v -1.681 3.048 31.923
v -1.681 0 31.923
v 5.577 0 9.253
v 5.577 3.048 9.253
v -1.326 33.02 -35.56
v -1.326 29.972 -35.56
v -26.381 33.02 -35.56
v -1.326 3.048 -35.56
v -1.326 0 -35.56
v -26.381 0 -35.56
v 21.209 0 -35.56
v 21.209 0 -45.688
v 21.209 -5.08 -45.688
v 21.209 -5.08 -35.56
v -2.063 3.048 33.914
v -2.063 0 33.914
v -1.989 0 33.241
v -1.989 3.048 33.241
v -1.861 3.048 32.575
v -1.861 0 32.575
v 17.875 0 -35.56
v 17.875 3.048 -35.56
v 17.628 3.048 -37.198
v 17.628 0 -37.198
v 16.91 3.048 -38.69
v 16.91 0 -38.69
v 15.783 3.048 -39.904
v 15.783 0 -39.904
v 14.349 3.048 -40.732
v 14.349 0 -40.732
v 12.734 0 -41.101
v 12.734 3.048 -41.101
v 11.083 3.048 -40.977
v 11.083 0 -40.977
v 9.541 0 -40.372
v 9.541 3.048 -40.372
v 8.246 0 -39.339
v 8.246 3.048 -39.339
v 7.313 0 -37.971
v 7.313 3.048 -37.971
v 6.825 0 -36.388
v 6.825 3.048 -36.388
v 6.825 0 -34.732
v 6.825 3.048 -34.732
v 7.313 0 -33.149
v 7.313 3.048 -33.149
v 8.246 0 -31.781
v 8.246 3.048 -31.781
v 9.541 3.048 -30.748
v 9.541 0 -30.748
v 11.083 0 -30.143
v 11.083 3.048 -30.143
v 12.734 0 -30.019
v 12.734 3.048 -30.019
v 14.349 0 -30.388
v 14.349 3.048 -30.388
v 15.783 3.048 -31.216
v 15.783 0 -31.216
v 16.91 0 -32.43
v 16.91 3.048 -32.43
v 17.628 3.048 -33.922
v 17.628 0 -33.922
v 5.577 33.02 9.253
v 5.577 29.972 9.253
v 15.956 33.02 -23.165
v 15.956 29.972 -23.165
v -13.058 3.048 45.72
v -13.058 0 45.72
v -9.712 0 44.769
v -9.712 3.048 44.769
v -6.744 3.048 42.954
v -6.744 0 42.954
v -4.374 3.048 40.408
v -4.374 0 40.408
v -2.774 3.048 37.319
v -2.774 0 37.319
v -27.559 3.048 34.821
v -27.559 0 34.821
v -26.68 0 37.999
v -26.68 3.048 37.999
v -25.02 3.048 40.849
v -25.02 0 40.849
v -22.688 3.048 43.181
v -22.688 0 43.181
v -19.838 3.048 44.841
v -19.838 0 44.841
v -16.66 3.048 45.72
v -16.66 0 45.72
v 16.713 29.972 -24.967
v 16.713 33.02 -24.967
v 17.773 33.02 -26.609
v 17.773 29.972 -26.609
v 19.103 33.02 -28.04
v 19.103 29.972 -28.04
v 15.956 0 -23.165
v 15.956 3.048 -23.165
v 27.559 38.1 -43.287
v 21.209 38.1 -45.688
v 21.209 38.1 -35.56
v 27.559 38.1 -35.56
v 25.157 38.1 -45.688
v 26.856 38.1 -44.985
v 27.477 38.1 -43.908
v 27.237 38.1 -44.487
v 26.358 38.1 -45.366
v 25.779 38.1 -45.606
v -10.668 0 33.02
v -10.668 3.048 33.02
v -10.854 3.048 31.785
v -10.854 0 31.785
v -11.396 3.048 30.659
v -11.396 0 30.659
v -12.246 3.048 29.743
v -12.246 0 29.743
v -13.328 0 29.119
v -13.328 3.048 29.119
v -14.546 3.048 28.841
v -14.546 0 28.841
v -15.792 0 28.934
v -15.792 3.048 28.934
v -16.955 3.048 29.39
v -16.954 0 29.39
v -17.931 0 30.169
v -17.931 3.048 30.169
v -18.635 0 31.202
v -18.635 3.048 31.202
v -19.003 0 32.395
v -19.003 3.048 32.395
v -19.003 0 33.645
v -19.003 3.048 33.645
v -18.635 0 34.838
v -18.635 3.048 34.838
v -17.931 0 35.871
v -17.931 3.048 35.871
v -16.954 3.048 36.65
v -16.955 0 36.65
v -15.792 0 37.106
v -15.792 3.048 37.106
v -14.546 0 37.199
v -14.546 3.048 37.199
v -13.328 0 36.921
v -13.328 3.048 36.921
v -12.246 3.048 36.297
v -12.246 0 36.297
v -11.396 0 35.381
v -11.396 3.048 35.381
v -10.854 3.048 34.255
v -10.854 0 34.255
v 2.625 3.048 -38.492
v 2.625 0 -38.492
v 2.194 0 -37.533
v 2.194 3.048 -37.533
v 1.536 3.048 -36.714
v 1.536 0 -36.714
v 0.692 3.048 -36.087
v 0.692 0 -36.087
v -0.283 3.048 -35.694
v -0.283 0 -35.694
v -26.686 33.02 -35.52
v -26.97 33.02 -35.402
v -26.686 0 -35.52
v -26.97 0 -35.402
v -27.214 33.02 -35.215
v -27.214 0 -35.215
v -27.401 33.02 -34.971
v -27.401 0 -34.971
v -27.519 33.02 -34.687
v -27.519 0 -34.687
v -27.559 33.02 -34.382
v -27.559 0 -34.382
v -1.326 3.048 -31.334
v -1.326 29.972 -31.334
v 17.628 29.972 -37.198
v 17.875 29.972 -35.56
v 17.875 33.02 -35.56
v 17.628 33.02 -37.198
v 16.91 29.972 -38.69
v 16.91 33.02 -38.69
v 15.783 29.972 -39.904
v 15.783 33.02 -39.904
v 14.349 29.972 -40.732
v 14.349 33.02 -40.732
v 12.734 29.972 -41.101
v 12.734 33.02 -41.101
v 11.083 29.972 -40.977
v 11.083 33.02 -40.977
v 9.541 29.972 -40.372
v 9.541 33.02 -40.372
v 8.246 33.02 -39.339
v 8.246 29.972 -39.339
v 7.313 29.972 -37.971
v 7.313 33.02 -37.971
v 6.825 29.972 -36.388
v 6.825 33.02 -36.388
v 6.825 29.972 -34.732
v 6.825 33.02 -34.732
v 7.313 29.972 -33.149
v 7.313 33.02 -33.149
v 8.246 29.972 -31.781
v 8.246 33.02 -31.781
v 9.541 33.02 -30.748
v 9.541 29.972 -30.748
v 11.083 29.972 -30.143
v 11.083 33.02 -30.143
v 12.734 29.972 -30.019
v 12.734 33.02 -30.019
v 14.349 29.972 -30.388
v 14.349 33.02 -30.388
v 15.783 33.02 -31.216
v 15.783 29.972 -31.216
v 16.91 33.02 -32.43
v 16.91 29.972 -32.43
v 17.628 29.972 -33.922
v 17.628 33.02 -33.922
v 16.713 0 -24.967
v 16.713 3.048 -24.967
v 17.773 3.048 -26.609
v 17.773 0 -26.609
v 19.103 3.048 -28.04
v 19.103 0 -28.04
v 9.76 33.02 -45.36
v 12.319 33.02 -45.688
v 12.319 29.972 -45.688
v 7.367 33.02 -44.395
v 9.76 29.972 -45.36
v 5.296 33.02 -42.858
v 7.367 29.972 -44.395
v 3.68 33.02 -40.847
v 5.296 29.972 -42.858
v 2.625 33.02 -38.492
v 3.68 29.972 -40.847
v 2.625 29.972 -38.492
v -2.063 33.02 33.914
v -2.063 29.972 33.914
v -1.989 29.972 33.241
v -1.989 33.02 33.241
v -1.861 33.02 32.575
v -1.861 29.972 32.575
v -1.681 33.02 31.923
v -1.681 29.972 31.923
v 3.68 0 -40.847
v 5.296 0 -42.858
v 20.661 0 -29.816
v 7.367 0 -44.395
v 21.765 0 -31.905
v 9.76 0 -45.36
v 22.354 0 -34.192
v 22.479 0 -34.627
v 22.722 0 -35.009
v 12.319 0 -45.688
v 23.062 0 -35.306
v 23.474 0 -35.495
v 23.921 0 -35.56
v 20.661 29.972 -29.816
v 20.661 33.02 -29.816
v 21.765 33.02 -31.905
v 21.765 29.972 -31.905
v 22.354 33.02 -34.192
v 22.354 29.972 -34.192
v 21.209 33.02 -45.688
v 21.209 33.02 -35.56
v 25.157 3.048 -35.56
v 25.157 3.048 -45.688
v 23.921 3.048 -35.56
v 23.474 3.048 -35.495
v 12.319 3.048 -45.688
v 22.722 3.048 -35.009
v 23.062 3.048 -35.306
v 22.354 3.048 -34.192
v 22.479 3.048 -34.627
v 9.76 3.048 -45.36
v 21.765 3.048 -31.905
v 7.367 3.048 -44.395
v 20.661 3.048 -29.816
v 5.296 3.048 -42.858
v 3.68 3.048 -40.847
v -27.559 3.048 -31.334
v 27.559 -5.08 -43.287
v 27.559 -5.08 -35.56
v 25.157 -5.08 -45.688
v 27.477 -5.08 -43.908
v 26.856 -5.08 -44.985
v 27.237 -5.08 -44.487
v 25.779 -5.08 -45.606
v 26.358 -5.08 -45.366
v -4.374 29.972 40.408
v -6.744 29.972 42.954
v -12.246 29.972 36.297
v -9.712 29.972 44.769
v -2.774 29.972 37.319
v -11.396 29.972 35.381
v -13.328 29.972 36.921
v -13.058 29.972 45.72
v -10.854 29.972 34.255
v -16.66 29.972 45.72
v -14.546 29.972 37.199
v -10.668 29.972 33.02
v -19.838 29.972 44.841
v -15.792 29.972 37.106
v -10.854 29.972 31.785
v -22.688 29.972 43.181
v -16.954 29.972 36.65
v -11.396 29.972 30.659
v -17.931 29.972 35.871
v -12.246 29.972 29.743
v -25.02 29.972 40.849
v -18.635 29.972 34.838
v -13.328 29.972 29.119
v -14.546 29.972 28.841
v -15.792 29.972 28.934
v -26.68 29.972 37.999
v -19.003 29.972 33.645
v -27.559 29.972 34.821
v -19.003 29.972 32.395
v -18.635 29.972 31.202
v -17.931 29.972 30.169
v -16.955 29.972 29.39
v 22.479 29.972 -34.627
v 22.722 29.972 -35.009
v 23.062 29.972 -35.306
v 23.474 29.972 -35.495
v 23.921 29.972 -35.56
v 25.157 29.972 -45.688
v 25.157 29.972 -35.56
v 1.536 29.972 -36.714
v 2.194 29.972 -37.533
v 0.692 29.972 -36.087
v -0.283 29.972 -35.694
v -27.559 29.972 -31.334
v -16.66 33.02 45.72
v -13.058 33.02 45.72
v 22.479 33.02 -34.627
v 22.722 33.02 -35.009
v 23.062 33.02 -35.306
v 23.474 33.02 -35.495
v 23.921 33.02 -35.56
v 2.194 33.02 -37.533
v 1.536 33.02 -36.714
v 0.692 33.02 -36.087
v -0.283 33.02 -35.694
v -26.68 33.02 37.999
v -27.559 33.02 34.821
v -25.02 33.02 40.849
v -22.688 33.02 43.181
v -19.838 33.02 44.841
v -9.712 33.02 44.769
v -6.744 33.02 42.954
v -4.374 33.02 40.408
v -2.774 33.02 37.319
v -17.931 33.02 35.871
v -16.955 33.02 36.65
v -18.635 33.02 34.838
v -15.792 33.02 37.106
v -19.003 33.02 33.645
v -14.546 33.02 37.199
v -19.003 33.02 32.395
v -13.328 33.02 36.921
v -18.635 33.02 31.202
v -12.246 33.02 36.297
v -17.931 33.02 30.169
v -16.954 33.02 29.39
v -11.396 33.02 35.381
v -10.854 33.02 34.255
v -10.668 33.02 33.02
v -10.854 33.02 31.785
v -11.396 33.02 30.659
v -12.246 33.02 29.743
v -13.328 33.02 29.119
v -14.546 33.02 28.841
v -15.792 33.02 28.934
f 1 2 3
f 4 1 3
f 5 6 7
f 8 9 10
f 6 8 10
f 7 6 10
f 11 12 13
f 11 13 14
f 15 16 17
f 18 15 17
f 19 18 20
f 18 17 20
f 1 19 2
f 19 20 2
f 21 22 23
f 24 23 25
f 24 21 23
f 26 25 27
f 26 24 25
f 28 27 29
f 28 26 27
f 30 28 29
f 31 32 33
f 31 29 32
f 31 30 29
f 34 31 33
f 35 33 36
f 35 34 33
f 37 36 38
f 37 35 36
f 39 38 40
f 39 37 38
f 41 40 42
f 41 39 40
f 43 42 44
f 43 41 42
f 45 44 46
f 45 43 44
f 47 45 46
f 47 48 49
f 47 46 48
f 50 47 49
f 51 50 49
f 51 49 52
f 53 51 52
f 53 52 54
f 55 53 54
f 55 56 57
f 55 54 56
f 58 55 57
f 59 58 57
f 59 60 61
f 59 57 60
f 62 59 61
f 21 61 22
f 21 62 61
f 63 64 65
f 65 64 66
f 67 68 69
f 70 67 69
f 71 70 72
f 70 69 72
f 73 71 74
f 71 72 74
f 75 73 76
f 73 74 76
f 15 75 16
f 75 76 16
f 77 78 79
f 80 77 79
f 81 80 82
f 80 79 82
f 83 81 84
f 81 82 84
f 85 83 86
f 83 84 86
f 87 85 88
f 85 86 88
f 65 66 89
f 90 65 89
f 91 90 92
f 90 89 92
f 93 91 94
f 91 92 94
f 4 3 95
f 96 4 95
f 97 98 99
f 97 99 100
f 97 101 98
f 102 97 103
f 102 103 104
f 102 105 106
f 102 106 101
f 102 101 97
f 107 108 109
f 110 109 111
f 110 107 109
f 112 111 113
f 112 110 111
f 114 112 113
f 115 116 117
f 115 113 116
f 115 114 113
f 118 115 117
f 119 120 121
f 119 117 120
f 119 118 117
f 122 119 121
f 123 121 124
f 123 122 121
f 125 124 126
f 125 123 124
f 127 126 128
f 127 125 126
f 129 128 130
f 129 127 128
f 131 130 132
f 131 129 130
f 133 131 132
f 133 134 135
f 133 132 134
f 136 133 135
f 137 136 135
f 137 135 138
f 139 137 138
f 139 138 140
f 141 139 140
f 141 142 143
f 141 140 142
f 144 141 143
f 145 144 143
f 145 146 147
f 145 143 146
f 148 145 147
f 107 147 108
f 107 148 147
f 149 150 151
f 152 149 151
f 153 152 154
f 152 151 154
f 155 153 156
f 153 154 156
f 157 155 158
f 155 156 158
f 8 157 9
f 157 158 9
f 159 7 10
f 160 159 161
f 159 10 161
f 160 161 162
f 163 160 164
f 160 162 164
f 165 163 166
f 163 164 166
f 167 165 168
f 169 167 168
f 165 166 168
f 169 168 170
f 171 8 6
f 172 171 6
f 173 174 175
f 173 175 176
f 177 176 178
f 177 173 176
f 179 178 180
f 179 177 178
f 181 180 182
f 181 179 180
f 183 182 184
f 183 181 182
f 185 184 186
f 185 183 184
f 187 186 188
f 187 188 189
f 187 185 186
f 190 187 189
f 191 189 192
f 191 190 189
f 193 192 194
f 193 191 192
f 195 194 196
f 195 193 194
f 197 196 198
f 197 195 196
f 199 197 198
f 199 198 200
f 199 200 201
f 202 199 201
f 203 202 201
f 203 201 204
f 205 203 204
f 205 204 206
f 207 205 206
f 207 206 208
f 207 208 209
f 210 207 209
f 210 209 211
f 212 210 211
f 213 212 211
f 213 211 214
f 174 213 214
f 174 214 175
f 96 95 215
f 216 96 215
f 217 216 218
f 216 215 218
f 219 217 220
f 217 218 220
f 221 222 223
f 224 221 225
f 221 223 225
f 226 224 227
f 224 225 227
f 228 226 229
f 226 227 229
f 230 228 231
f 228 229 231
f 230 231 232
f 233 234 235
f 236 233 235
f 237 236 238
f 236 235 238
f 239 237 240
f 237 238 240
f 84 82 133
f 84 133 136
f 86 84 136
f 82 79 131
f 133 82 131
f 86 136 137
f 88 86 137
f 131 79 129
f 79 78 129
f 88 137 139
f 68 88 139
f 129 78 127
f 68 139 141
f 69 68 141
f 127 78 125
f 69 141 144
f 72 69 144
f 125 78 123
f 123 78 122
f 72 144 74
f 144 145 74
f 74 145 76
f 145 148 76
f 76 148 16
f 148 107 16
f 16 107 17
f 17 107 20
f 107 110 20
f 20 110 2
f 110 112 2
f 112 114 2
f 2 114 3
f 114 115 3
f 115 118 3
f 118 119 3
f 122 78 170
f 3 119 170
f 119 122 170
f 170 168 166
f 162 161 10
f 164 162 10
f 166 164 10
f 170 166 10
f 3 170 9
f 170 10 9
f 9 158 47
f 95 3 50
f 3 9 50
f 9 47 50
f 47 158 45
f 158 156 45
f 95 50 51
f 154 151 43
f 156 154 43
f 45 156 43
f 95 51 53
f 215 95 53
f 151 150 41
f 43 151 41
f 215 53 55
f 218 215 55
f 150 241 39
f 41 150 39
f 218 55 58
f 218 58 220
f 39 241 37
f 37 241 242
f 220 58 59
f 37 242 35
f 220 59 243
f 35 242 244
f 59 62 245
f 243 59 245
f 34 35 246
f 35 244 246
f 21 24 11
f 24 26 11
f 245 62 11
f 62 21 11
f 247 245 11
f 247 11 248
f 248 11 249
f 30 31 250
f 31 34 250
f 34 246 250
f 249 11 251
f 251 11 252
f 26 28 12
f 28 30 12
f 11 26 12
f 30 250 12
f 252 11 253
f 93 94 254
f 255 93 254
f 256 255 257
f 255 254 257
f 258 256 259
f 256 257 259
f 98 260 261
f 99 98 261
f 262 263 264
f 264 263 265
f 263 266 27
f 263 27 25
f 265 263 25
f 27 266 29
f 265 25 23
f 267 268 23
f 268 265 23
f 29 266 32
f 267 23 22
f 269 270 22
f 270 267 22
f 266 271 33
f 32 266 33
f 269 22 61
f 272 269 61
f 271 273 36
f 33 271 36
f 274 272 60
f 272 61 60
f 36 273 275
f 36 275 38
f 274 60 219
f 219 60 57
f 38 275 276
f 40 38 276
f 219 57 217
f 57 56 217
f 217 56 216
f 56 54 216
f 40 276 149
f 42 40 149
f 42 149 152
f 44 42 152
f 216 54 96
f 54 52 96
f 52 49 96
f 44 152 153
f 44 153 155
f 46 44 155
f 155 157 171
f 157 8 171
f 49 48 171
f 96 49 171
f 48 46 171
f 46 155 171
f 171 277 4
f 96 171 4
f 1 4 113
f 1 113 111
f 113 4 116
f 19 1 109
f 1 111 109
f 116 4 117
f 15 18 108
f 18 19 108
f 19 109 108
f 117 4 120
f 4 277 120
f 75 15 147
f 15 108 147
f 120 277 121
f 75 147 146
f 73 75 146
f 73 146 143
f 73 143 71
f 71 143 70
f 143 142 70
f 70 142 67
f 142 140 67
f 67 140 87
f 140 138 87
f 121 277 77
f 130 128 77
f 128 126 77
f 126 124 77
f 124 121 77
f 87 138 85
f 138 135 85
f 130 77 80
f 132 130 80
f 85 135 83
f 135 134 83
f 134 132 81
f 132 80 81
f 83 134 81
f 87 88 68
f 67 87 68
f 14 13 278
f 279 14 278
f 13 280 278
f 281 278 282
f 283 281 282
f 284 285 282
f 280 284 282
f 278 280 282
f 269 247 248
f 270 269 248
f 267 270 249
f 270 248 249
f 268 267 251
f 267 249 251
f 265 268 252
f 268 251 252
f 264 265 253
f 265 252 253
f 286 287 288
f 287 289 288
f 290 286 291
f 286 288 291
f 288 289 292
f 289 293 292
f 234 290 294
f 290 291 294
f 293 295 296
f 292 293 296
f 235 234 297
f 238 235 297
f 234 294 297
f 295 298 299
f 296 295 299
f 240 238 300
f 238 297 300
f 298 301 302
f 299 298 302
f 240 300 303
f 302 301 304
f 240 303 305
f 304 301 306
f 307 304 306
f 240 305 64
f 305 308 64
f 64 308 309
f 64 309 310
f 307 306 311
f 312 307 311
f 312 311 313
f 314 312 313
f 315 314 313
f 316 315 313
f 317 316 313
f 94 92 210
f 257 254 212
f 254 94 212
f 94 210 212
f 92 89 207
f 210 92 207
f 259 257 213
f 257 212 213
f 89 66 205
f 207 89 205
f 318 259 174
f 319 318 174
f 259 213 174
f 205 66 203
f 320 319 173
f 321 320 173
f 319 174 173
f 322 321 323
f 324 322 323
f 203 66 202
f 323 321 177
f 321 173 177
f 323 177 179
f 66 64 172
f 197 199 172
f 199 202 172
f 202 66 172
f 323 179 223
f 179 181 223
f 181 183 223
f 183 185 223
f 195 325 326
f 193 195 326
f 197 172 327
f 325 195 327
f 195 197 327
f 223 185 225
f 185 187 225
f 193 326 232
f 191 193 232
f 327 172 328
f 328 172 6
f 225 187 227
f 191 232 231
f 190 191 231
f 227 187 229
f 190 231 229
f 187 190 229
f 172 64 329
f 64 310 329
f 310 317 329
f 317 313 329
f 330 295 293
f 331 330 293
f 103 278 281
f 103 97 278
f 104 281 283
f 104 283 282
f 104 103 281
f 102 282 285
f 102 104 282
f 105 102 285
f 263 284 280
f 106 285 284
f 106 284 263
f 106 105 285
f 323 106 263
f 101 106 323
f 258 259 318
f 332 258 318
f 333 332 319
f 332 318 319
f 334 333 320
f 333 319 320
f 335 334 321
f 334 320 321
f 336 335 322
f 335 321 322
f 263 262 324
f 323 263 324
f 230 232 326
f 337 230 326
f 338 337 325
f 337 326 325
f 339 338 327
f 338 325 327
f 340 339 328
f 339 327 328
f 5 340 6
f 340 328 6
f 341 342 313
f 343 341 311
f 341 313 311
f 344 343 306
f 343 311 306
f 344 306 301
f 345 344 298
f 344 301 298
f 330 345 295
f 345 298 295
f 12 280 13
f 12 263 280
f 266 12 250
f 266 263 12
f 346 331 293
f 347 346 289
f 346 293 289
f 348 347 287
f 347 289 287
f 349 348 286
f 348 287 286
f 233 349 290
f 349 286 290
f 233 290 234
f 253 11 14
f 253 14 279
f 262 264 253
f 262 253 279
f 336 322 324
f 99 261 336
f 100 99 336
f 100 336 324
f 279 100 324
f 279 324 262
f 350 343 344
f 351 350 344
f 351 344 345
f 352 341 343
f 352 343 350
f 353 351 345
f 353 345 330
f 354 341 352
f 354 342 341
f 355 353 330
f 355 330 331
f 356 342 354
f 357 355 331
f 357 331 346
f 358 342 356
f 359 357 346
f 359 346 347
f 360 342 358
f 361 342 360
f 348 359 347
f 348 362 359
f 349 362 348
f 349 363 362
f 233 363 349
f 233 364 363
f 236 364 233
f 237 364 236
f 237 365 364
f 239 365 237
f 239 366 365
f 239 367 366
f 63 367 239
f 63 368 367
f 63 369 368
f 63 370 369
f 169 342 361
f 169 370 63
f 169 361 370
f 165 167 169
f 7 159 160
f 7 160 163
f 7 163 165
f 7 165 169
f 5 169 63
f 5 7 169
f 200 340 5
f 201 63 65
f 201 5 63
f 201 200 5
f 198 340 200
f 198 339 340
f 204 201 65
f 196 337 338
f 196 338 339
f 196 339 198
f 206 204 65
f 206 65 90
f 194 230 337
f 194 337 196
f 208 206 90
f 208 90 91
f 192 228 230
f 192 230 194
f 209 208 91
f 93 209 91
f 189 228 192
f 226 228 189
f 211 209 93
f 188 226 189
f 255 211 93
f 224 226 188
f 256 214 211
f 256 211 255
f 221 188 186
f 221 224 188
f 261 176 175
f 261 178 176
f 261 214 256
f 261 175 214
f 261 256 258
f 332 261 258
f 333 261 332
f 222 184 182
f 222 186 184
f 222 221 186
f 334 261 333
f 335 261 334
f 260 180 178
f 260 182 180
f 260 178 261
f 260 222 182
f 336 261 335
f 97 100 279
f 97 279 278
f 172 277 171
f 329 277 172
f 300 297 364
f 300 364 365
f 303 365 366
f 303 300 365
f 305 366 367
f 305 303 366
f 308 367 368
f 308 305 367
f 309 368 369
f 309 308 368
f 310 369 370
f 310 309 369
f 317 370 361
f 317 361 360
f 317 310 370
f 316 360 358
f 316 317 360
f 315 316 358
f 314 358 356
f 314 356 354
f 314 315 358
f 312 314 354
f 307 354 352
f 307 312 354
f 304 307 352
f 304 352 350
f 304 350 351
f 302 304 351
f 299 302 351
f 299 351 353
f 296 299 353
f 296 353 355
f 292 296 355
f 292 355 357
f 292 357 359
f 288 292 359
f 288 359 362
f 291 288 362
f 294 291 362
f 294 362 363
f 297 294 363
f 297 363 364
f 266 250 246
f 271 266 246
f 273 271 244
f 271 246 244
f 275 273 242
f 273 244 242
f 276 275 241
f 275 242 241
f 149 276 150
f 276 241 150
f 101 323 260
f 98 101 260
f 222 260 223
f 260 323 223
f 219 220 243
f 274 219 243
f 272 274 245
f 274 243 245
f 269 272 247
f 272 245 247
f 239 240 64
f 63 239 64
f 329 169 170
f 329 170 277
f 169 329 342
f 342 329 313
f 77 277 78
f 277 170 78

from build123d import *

# Parameters (mm, degrees)
SKETCH1_R               = 4.191
SKETCH1_R_2             = 5.55625
BOSS_EXTRUDE1_DEPTH     = 33.02
CUT_EXTRUDE1_DEPTH      = 56.118
SKETCH3_W               = 26.483565884
SKETCH3_H               = 26.924
CUT_EXTRUDE2_DEPTH      = 11.12825
CUT_EXTRUDE2_DEPTH_BACK = 82.28
BOSS_EXTRUDE2_DEPTH     = 5.08


with BuildPart() as part:
    # Sketch1 → Boss-Extrude1 (new body)
    with BuildSketch(Plane(origin=(0, 0, 0), x_dir=(1, 0, 0), z_dir=(0, 1, 0))):
        with BuildLine():
            ThreePointArc((-27.559, -34.820535754), (-23.929058682, -42.090058682), (-16.659535754, -45.72))
            Line((-16.659535754, -45.72), (-13.058464246, -45.72))
            ThreePointArc((-13.058464246, -45.72), (-5.472288324, -41.761943314), (-2.063174534, -33.91374473))
            ThreePointArc((-2.063174534, -33.91374473), (-1.931764874, -32.906728948), (-1.680693889, -31.922700165))
            Line((-1.680693889, -31.922700165), (5.577256486, -9.252591406))
            Line((5.577256486, -9.252591406), (15.95594723, 23.165107224))
            ThreePointArc((15.95594723, 23.165107224), (17.206676654, 25.810946447), (19.103326913, 28.039736946))
            ThreePointArc((19.103326913, 28.039736946), (21.273883819, 30.828033828), (22.3544782, 34.19229193))
            ThreePointArc((22.3544782, 34.19229193), (22.881358513, 35.169970415), (23.921231105, 35.56))
            Line((23.921231105, 35.56), (27.559, 35.56))
            Line((27.559, 35.56), (27.559, 43.286638959))
            ThreePointArc((27.559, 43.286638959), (26.855584412, 44.984834412), (25.157388959, 45.68825))
            Line((25.157388959, 45.68825), (12.319, 45.68825))
            ThreePointArc((12.319, 45.68825), (6.28241864, 43.692719935), (2.624566002, 38.492472937))
            ThreePointArc((2.624566002, 38.492472937), (1.133892546, 36.373232242), (-1.326176925, 35.56))
            Line((-1.326176925, 35.56), (-26.38140718, 35.56))
            ThreePointArc((-26.38140718, 35.56), (-27.214091048, 35.215091048), (-27.559, 34.38240718))
            Line((-27.559, 34.38240718), (-27.559, -31.219464246))
            Line((-27.559, -31.219464246), (-27.559, -34.820535754))
        make_face()
        with Locations((-14.859, -33.02)):
            Circle(SKETCH1_R, mode=Mode.SUBTRACT)
        with Locations((12.319, 35.56)):
            Circle(SKETCH1_R_2, mode=Mode.SUBTRACT)
    extrude(amount=BOSS_EXTRUDE1_DEPTH)

    # Sketch2 → Cut-Extrude1 (cut, through all)
    with BuildSketch(Plane.ZY.offset(27.559)):
        Polygon((-31.33440718, 29.972), (42.672, 29.972), (45.72, 29.972), (45.72, 3.048), (42.672, 3.048), (-31.33440718, 3.048), align=None)
    extrude(amount=-CUT_EXTRUDE1_DEPTH, mode=Mode.SUBTRACT)

    # Sketch3 → Cut-Extrude2 (cut, two sides)
    with BuildSketch(Plane(origin=(0, 0, -35.56), x_dir=(-1, 0, 0), z_dir=(0, 0, -1))) as cut_extrude2_sk:
        with Locations((-11.915606017, 16.51)):
            Rectangle(SKETCH3_W, SKETCH3_H)
    extrude(amount=CUT_EXTRUDE2_DEPTH, mode=Mode.SUBTRACT)
    extrude(cut_extrude2_sk.sketch, amount=-CUT_EXTRUDE2_DEPTH_BACK, mode=Mode.SUBTRACT)

    # Sketch4 → Boss-Extrude2 (add)
    with BuildSketch(Plane(origin=(0, 33.02, 0), x_dir=(1, 0, 0), z_dir=(0, 1, 0))):
        with BuildLine():
            Line((21.209, 45.68825), (21.209, 35.56))
            Line((21.209, 35.56), (27.559, 35.56))
            Line((27.559, 35.56), (27.559, 43.286638959))
            ThreePointArc((27.559, 43.286638959), (26.855584412, 44.984834412), (25.157388959, 45.68825))
            Line((25.157388959, 45.68825), (21.209, 45.68825))
        make_face()
    boss_extrude2 = extrude(amount=BOSS_EXTRUDE2_DEPTH)

    # Mirror1: Boss-Extrude2 across plane
    add(boss_extrude2.mirror(Plane.ZX.offset(16.51)))


solid = part.part
